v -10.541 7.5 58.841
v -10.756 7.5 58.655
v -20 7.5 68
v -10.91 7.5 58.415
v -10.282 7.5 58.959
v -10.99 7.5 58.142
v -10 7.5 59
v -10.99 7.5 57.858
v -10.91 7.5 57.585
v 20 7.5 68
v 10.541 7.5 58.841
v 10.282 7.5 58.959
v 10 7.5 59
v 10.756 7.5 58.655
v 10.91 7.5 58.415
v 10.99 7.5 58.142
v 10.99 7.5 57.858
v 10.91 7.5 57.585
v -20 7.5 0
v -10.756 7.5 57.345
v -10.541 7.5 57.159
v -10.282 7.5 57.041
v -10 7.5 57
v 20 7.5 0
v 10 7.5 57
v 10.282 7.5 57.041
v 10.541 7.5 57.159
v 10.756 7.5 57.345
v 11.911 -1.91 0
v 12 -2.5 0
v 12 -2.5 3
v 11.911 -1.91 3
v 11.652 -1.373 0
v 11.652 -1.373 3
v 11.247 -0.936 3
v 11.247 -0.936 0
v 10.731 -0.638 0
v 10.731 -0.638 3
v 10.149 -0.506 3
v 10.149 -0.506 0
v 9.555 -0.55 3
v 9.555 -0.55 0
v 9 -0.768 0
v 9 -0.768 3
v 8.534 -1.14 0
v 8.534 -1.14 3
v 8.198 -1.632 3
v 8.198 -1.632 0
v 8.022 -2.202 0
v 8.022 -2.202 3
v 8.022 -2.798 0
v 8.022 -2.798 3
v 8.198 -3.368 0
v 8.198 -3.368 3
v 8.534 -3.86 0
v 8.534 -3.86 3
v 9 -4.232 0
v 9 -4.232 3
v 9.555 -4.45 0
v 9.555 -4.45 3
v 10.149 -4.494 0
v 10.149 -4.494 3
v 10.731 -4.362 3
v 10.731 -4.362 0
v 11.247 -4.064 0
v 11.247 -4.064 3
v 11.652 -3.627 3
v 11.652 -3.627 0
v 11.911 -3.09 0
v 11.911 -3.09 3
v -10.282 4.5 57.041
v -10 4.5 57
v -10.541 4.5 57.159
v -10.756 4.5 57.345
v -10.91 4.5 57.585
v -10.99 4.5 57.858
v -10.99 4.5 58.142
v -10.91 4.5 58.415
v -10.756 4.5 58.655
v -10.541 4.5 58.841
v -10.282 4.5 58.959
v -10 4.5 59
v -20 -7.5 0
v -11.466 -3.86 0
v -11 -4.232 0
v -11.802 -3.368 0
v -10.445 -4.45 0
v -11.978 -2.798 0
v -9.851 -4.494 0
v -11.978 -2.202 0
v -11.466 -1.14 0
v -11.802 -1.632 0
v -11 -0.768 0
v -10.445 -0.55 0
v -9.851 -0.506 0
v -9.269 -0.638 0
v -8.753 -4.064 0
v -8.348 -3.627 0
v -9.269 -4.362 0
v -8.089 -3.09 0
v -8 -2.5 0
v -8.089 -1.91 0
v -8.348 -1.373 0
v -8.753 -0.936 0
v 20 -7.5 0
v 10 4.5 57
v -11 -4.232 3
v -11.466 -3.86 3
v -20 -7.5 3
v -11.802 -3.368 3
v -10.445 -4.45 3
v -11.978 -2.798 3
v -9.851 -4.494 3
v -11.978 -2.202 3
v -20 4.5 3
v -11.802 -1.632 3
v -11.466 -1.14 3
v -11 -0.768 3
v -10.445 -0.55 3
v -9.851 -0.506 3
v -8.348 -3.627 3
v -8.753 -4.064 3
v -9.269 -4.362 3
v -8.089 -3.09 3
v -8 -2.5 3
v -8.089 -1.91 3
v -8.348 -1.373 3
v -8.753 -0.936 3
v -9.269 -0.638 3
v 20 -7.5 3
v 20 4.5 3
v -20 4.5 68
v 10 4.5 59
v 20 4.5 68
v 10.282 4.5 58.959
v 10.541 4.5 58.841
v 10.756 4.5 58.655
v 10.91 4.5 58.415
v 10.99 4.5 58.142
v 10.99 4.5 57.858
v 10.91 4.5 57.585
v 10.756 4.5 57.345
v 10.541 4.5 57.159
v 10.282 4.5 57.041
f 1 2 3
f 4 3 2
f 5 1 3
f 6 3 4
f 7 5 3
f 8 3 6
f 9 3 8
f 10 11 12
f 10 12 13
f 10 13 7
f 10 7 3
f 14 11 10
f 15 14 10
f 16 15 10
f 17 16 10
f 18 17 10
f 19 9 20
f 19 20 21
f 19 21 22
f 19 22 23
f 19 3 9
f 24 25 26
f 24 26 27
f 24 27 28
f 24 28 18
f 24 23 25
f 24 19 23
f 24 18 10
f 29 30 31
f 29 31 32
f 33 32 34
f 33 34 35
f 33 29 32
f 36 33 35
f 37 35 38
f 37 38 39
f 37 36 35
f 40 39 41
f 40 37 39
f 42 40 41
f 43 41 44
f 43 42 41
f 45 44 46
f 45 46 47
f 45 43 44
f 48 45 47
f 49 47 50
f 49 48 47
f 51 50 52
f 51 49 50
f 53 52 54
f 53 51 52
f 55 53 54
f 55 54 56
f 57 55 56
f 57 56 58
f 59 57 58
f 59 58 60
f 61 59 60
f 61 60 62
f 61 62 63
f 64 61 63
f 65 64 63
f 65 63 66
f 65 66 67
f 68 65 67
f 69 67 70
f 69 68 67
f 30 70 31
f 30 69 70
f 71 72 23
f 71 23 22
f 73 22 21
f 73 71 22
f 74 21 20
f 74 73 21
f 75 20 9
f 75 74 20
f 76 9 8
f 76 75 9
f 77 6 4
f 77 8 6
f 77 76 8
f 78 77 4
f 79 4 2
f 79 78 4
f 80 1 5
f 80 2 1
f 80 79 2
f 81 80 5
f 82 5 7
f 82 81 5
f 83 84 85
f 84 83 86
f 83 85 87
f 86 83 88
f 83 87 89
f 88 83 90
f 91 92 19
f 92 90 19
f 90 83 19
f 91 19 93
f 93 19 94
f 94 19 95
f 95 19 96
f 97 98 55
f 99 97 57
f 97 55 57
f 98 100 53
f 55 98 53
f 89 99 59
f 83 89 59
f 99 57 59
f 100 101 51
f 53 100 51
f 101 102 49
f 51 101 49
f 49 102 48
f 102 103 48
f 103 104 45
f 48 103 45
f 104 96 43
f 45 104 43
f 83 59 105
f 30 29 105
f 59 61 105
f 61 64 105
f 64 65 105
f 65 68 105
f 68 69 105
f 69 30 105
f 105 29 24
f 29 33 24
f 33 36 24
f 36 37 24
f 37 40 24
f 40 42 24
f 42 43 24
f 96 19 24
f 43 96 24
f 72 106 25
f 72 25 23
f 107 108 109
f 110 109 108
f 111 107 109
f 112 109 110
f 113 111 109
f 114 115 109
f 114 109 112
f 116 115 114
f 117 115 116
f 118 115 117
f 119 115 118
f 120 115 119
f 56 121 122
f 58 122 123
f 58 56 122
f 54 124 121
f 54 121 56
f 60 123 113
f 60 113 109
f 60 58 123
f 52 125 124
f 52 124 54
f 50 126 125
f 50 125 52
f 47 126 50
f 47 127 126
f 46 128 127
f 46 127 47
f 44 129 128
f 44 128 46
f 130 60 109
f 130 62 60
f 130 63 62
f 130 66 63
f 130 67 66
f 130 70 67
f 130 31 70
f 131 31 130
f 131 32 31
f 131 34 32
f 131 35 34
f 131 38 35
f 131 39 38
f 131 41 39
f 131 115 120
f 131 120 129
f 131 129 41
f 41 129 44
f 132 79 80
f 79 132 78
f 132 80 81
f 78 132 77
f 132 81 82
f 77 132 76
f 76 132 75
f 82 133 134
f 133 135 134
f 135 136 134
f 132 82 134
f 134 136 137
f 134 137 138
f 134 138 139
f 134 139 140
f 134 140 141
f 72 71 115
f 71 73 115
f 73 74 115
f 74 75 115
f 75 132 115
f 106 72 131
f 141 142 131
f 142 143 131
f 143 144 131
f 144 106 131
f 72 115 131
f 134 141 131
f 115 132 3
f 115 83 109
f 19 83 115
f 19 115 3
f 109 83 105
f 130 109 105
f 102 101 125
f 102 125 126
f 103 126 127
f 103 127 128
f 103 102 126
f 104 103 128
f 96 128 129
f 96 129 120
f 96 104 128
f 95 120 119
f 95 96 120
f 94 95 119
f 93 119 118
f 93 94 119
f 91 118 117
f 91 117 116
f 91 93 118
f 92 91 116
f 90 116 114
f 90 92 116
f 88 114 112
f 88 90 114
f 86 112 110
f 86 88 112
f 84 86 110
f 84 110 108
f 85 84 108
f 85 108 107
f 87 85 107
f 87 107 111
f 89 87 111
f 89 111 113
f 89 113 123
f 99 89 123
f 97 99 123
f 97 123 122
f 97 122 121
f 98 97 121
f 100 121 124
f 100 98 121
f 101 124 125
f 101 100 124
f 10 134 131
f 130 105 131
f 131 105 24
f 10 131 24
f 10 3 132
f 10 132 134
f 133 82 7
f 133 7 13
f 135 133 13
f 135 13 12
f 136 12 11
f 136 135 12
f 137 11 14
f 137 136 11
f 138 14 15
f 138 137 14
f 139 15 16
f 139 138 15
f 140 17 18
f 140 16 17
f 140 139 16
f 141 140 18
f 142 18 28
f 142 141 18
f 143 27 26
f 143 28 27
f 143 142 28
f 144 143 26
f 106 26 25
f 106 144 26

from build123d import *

# Parameters (mm, degrees)
SKETCH1_W           = 40
SKETCH1_H           = 15
SKETCH1_R           = 2
BOSS_EXTRUDE1_DEPTH = 3
SKETCH2_W           = 40
SKETCH2_H           = 3
BOSS_EXTRUDE2_DEPTH = 65
CUT_EXTRUDE1_DEPTH  = 65


with BuildPart() as part:
    # Sketch1 → Boss-Extrude1 (new body)
    with BuildSketch(Plane.XY):
        Rectangle(SKETCH1_W, SKETCH1_H)
        with Locations((-10, -2.5)):
            Circle(SKETCH1_R, mode=Mode.SUBTRACT)
        with Locations((10, -2.5)):
            Circle(SKETCH1_R, mode=Mode.SUBTRACT)
    extrude(amount=BOSS_EXTRUDE1_DEPTH)

    # Sketch2 → Boss-Extrude2 (add)
    with BuildSketch(Plane.XY.offset(3)):
        with Locations((0, 6)):
            Rectangle(SKETCH2_W, SKETCH2_H)
    extrude(amount=BOSS_EXTRUDE2_DEPTH)

    # Sketch3 → Cut-Extrude1 (cut)
    with BuildSketch(Plane.XZ.offset(-4.5)):
        with BuildLine():
            Line((-10, 59), (10, 59))
            ThreePointArc((10, 59), (11, 58), (10, 57))
            Line((10, 57), (-10, 57))
            ThreePointArc((-10, 57), (-11, 58), (-10, 59))
        make_face()
    extrude(amount=-CUT_EXTRUDE1_DEPTH, mode=Mode.SUBTRACT)


solid = part.part
